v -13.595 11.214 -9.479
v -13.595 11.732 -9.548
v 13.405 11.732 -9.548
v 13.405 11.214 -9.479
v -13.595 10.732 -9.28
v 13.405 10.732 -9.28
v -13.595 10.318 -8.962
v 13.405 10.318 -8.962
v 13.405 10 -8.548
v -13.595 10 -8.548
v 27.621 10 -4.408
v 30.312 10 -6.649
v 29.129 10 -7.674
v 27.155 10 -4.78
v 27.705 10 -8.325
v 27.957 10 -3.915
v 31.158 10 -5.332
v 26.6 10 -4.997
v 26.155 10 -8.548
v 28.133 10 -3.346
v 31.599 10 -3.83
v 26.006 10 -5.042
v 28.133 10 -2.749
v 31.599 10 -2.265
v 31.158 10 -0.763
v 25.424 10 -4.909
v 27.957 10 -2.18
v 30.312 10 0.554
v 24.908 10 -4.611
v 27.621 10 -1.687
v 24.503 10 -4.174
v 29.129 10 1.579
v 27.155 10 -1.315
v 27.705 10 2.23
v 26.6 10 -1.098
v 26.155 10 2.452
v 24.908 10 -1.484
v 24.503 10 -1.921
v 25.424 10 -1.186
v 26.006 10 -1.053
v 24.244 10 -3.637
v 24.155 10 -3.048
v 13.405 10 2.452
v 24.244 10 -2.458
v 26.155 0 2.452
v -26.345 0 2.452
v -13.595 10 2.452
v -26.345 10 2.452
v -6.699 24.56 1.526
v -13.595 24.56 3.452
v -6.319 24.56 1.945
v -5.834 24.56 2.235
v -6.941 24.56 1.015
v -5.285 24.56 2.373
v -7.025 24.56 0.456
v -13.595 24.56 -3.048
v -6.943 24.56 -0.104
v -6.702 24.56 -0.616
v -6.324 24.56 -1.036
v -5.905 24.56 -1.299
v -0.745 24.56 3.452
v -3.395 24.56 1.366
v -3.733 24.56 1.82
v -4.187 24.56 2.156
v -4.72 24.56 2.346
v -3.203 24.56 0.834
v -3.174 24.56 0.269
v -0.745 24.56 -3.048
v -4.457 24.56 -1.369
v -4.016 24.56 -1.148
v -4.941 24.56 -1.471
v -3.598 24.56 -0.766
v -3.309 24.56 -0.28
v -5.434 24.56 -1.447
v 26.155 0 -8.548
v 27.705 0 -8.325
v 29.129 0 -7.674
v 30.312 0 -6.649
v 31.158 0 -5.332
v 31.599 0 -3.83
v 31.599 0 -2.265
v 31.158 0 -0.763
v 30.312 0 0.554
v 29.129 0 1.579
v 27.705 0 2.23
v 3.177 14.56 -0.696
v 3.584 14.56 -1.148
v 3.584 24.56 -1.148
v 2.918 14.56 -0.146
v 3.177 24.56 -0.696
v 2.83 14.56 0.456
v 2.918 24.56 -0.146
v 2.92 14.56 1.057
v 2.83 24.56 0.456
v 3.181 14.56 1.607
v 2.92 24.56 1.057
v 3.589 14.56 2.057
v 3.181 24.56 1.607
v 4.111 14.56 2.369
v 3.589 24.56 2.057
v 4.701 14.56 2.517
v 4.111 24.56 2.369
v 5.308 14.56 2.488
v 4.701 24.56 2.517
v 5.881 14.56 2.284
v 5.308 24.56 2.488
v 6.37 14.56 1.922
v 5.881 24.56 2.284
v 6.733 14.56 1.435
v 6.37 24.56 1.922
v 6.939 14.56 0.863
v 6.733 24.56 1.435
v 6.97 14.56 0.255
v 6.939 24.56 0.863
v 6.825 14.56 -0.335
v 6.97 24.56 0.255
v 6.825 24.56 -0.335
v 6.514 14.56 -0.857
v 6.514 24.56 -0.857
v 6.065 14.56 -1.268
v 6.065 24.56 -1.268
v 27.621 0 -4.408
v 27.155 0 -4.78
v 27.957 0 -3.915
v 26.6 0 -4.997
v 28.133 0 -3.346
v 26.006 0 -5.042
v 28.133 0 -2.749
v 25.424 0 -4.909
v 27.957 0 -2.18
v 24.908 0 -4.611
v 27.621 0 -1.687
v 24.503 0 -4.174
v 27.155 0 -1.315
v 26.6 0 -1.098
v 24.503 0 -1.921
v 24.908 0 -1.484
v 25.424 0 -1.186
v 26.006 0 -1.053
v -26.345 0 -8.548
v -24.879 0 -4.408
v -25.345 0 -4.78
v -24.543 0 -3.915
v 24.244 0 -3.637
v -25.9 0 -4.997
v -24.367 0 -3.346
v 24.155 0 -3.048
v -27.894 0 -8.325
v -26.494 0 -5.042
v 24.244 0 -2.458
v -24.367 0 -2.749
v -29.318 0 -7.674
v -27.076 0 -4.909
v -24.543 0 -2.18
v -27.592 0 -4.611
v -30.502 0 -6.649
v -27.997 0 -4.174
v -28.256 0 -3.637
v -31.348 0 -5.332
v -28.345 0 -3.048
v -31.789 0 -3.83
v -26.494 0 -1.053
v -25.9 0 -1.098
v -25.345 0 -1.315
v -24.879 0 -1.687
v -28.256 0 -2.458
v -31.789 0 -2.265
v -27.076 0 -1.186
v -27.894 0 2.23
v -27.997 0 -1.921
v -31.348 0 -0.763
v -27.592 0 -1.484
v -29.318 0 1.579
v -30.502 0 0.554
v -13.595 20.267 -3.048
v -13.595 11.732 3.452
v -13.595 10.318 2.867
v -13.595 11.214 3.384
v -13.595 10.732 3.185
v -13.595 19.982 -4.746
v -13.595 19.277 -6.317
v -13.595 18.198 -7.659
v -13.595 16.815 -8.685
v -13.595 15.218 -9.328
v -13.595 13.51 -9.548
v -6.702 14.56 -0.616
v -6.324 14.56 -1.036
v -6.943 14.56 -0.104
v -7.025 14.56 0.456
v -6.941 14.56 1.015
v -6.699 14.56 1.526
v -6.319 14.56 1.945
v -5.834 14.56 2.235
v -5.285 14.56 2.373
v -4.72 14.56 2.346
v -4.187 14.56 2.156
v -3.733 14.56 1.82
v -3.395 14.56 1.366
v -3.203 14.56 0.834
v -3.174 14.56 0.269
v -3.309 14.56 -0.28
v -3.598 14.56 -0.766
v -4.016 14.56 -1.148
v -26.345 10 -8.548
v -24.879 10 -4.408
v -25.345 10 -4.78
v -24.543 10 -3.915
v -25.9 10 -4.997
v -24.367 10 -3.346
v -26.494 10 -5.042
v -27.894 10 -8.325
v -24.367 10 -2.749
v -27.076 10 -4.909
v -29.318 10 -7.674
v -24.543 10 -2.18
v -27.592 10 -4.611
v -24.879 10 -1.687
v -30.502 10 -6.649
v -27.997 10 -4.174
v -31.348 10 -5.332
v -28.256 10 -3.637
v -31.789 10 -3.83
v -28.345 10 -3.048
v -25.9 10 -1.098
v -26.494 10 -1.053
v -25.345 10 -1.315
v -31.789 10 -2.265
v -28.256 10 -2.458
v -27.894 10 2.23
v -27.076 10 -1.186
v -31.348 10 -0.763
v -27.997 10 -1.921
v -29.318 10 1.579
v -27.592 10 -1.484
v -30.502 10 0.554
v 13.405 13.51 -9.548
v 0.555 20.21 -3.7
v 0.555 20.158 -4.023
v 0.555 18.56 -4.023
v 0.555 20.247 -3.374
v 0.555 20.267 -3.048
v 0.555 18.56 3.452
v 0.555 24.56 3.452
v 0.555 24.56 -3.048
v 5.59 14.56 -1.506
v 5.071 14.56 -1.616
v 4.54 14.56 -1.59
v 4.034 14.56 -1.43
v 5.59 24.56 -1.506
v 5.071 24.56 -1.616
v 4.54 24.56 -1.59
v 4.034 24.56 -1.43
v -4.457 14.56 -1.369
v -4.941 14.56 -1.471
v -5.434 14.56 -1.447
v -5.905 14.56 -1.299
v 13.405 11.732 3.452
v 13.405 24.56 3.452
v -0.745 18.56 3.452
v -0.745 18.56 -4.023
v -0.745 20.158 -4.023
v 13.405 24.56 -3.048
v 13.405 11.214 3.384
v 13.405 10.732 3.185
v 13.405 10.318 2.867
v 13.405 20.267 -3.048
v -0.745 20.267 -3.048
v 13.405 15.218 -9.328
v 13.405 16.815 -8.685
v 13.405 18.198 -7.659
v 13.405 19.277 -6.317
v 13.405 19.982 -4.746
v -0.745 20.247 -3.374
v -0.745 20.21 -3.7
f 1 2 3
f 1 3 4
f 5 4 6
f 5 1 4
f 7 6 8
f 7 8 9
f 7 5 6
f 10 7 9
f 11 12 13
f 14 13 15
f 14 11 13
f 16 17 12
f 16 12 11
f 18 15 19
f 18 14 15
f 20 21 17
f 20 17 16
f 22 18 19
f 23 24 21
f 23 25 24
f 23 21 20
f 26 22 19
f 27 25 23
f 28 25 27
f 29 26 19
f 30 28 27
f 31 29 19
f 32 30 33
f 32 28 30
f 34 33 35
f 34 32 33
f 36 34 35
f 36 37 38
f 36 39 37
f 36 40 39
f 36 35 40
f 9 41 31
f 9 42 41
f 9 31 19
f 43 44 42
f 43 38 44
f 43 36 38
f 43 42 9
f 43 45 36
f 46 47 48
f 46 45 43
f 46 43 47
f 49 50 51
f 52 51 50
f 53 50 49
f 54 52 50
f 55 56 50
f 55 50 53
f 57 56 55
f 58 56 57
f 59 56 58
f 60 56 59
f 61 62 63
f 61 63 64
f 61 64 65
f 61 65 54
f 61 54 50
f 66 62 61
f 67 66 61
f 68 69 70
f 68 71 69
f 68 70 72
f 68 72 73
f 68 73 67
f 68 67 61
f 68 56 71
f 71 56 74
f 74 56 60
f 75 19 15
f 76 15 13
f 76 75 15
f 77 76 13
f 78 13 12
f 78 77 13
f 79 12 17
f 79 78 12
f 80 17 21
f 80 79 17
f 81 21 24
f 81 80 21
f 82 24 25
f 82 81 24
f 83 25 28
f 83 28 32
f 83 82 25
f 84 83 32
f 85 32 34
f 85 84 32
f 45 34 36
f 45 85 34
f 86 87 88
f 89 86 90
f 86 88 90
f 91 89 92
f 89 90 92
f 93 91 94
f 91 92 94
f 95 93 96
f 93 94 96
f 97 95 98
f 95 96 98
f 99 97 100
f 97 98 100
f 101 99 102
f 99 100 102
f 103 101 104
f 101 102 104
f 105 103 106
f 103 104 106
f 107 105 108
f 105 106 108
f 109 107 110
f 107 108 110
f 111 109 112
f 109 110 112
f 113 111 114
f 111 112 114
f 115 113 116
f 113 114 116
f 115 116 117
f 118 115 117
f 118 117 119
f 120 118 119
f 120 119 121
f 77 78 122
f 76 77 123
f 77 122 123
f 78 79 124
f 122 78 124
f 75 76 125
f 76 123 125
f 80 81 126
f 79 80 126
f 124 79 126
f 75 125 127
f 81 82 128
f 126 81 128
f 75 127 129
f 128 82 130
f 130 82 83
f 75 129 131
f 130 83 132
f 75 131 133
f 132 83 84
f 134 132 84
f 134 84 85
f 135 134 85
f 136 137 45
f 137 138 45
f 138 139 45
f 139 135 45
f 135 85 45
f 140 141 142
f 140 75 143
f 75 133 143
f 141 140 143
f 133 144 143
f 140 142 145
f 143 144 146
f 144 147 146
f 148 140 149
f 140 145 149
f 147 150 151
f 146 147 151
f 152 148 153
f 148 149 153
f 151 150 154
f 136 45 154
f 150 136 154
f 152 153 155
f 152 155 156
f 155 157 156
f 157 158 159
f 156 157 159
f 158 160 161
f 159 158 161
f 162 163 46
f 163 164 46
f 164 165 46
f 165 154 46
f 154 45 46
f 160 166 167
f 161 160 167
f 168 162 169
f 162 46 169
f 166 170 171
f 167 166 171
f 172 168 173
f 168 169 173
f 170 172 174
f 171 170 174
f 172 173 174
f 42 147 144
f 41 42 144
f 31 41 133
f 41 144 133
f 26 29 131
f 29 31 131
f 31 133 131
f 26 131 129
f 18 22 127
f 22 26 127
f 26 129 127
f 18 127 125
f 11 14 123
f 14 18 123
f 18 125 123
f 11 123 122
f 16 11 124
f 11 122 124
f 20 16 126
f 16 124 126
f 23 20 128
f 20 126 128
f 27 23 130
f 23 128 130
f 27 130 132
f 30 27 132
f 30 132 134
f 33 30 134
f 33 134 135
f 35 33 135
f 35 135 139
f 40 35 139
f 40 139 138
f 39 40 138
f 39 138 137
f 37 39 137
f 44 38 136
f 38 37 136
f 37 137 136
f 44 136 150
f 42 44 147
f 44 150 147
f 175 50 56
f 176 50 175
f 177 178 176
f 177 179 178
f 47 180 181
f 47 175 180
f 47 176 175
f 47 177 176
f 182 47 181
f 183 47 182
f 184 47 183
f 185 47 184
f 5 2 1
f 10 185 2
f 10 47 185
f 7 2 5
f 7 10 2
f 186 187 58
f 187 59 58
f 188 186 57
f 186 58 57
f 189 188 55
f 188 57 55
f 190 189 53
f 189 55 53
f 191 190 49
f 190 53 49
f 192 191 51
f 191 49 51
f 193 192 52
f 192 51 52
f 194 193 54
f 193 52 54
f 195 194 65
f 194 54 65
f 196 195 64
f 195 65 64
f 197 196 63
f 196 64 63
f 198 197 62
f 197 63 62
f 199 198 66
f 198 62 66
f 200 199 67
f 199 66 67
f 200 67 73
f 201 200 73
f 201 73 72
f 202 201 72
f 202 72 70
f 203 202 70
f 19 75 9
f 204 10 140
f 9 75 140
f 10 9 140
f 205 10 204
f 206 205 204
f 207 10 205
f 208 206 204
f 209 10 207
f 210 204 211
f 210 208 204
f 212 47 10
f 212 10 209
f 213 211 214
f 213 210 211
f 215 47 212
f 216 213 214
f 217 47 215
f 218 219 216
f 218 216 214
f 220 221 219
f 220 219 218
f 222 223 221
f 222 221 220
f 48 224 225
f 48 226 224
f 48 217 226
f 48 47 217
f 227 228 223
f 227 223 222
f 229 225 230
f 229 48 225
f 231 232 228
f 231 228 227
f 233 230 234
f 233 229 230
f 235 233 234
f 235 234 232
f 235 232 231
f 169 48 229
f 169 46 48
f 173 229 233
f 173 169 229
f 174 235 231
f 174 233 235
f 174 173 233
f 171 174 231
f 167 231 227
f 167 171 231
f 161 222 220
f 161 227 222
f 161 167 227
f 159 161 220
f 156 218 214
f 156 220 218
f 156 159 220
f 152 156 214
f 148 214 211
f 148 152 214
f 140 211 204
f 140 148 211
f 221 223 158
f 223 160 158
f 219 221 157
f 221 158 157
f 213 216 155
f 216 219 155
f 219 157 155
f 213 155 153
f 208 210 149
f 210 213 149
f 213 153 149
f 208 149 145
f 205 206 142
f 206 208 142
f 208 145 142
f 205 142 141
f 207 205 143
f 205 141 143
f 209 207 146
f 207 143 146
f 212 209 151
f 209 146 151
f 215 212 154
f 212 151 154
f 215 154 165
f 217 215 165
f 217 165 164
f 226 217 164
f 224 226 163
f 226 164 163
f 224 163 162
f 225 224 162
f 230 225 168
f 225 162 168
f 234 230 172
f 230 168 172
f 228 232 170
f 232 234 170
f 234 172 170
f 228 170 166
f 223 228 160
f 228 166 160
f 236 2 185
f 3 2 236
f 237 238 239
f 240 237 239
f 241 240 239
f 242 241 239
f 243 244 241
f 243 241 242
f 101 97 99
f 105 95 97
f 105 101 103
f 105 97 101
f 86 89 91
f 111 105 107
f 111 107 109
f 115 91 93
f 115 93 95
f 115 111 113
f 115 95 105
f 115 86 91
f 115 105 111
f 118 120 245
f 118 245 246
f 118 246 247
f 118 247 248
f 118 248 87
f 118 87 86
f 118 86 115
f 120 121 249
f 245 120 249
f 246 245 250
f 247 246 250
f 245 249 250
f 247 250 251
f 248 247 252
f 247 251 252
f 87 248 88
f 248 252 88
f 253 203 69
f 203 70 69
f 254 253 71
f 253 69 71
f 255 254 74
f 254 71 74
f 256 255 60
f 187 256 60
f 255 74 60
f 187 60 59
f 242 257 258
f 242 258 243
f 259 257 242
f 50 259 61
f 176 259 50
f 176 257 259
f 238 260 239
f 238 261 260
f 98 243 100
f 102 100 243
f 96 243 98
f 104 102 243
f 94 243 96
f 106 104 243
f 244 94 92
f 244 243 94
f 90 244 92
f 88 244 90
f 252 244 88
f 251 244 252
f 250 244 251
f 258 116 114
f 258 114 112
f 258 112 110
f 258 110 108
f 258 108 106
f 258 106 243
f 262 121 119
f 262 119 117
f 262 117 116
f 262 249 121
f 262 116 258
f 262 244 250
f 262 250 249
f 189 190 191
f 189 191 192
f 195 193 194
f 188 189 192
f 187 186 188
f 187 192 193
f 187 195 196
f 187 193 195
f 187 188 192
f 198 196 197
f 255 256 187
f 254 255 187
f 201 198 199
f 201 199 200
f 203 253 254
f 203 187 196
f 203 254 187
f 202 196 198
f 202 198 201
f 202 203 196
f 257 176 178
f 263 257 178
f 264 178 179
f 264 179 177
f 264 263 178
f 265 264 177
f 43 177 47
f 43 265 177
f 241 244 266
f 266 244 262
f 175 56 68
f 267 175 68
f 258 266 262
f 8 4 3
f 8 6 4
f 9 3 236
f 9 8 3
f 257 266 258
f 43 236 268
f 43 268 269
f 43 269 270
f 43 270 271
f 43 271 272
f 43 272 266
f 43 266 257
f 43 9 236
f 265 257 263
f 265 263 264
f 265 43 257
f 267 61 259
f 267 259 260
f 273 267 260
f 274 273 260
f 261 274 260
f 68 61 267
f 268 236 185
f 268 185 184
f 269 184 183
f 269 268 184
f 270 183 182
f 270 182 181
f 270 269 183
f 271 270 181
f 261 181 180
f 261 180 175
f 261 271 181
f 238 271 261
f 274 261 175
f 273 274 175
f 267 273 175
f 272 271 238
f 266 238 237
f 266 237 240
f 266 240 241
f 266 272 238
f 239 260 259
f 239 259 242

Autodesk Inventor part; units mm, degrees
ref_plane "YZ Plane" through (0, 0, 0) normal (1, 0, 0) x (0, 1, 0)
ref_plane "XZ Plane" through (0, 0, 0) normal (0, 1, 0) x (-1, 0, 0)
ref_plane "XY Plane" through (0, 0, 0) normal (0, 0, 1) x (1, 0, 0)
sketch "Sketch1" plane through (0, 0, 0) normal (0, 1, 0) x (-1, 0, 0)
  circle A0 centre (-26.1551, -3.0475) radius 2
  arc A1 (-34.9051, -0.0475) -> (-17.4051, -0.0475) centre (-26.1551, -0.0475) ccw
  arc A2 (17.5949, -0.0475) -> (35.0949, -0.0475) centre (26.3449, -0.0475) ccw
  circle A3 centre (26.3449, -3.0475) radius 2
  circle A4 centre (-26.1551, -3.0475) radius 2
  circle A5 centre (26.3449, -3.0475) radius 2
  circle A6 centre (26.3449, -0.0475) radius 8.75
  circle A7 centre (-26.1551, -0.0475) radius 8.75
  line L0 (-34.9051, -0.0475) -> (-17.4051, -0.0475)
  line L1 (17.5949, -0.0475) -> (35.0949, -0.0475)
  circle A8 centre (-26.1551, -3.0475) radius 5.5
  circle A9 centre (26.3449, -3.0475) radius 5.5
  line L2 (-26.1551, -8.5475) -> (26.3449, -8.5475)
  line L3 (-26.1551, 2.4525) -> (26.3449, 2.4525)
  point P0 (0, 0)
  dimension "d0" = 11
  dimension "d1" = 11
extrude "Extrusion1" add sketch "Sketch1" along normal blind 10 contours L2 A8 L0 A1 | A1 A7 L3 A6 A2 L2 | A7 L0 A8 L3 | A8 L0 | L0 A8 | A2 L1 A9 L2 | L3 A9 L1 A6 | A9 L1 | A9 L1 picked at (-18.6939, -1.0014) picked at (-20.5799, 1.133) picked at (18.8536, -1.0809) picked at (20.7697, 1.133)
sketch "Sketch2" plane through (0, 10, 0) normal (0, 1, 0) x (1, 0, 0)
  line L0 (26.1551, 8.5475) -> (-26.3449, 8.5475) projected
  line L1 (-26.3449, -2.4525) -> (26.1551, -2.4525) projected
  arc A0 (-26.3449, 8.5475) -> (-26.3449, -2.4525) centre (-26.3449, 3.0475) ccw projected
  arc A1 (26.1551, -2.4525) -> (26.1551, 8.5475) centre (26.1551, 3.0475) ccw projected
  line L2 (-31.8449, 3.0475) -> (31.6551, 3.0475)
  line L3 (13.4051, -3.4525) -> (-13.5949, -3.4525)
  line L4 (-13.5949, -3.4525) -> (-13.5949, 9.5475)
  line L5 (-13.5949, 9.5475) -> (13.4051, 9.5475)
  line L6 (13.4051, 9.5475) -> (13.4051, -3.4525)
  line L7 (13.4051, -3.4525) -> (-13.5949, 9.5475) construction
  line L8 (-13.5949, -3.4525) -> (13.4051, 9.5475) construction
  point P0 (0, 0)
  point P1 (-0.0949, 3.0475)
  dimension "d4" = 27
  dimension "d5" = 13
extrude "Extrusion2" add sketch "Sketch2" along normal blind 14.56 contours L6 L2 L4 L0 | L0 L4 L5 L6 | L6 L1 L4 L2 | L6 L3 L4 L1
fillet "Fillet1" radius 2 2 edges at (-0.0949, 10, 3.4525) (-0.0949, 10, -9.5475)
sketch "Sketch3" plane through (0, 24.56, 0) normal (0, 1, 0) x (1, 0, 0)
  arc A0 (-6.3236, 1.0357) -> (-4.0158, 1.1475) centre (-5.0949, -0.4525) ccw
  arc A1 (3.5842, 1.1475) -> (6.0652, 1.2676) centre (4.9051, -0.4525) ccw
  circle A2 centre (4.9051, -0.4525) radius 2.0748
  circle A3 centre (-5.0949, -0.4525) radius 1.9299
  line L0 (-13.5949, 9.5475) -> (-13.5949, -3.4525) projected
  line L1 (13.4051, 9.5475) -> (-13.5949, 9.5475) projected
  line L2 (-13.5949, -3.4525) -> (13.4051, -3.4525) projected
  line L3 (13.4051, -3.4525) -> (13.4051, 9.5475) projected
  point P0 (0, 0)
  point P1 (6.0652, 1.2676)
  point P2 (-4.0158, 1.1475)
  dimension "d12" = 8.5
  dimension "d13" = 8.5
extrude "Extrusion3" cut sketch "Sketch3" against normal blind 10 contours A3 A0 | A2 A1
sketch "Sketch4" plane through (0, 24.56, 0) normal (0, 1, 0) x (1, 0, 0)
  line L0 (13.4051, 9.5475) -> (-13.5949, 9.5475) projected
  line L1 (-13.5949, -2.4525) -> (-13.5949, 8.5475) projected
  line L2 (13.4051, 9.5475) -> (-13.5949, 9.5475)
  line L3 (-13.5949, 9.5475) -> (-13.5949, 3.0475)
  line L4 (-13.5949, 3.0475) -> (13.4051, 3.0475)
  line L5 (13.4051, 3.0475) -> (13.4051, 9.5475)
  point P0 (0, 0)
extrude "Extrusion4" cut sketch "Sketch4" against normal blind 4.2875
fillet "Fillet2" radius 6.7625 1 edges at (-0.0949, 20.2725, -9.5475)
sketch "Sketch5" plane through (0, 24.56, 0) normal (0, 1, 0) x (1, 0, 0)
  line L0 (-13.5949, 3.0475) -> (-13.5949, 9.5475) projected
  line L1 (13.4051, -3.4525) -> (-13.5949, -3.4525) projected
  line L2 (-13.5949, 3.0475) -> (13.4051, 3.0475)
  line L3 (13.4051, 3.0475) -> (13.4051, -3.4525)
  line L4 (13.4051, -3.4525) -> (-13.5949, -3.4525)
  line L5 (-13.5949, -3.4525) -> (-13.5949, 3.0475)
  line L6 (0.5551, -10.9283) -> (-0.7449, -10.9283)
  line L7 (-0.7449, -10.9283) -> (-0.7449, 4.0233)
  line L8 (-0.7449, 4.0233) -> (0.5551, 4.0233)
  line L9 (0.5551, 4.0233) -> (0.5551, -10.9283)
  line L10 (0.5551, -10.9283) -> (-0.7449, 4.0233) construction
  line L11 (-0.7449, -10.9283) -> (0.5551, 4.0233) construction
  point P0 (0, 0)
  point P1 (-0.0949, -3.4525)
  dimension "d19" = 1.3
extrude "Extrusion5" cut sketch "Sketch5" against normal blind 6 contours L9 L6 L7 L1 | L1 L7 L2 L9 | L2 L7 L8 L9
properties part number "Servo Holder short side"
